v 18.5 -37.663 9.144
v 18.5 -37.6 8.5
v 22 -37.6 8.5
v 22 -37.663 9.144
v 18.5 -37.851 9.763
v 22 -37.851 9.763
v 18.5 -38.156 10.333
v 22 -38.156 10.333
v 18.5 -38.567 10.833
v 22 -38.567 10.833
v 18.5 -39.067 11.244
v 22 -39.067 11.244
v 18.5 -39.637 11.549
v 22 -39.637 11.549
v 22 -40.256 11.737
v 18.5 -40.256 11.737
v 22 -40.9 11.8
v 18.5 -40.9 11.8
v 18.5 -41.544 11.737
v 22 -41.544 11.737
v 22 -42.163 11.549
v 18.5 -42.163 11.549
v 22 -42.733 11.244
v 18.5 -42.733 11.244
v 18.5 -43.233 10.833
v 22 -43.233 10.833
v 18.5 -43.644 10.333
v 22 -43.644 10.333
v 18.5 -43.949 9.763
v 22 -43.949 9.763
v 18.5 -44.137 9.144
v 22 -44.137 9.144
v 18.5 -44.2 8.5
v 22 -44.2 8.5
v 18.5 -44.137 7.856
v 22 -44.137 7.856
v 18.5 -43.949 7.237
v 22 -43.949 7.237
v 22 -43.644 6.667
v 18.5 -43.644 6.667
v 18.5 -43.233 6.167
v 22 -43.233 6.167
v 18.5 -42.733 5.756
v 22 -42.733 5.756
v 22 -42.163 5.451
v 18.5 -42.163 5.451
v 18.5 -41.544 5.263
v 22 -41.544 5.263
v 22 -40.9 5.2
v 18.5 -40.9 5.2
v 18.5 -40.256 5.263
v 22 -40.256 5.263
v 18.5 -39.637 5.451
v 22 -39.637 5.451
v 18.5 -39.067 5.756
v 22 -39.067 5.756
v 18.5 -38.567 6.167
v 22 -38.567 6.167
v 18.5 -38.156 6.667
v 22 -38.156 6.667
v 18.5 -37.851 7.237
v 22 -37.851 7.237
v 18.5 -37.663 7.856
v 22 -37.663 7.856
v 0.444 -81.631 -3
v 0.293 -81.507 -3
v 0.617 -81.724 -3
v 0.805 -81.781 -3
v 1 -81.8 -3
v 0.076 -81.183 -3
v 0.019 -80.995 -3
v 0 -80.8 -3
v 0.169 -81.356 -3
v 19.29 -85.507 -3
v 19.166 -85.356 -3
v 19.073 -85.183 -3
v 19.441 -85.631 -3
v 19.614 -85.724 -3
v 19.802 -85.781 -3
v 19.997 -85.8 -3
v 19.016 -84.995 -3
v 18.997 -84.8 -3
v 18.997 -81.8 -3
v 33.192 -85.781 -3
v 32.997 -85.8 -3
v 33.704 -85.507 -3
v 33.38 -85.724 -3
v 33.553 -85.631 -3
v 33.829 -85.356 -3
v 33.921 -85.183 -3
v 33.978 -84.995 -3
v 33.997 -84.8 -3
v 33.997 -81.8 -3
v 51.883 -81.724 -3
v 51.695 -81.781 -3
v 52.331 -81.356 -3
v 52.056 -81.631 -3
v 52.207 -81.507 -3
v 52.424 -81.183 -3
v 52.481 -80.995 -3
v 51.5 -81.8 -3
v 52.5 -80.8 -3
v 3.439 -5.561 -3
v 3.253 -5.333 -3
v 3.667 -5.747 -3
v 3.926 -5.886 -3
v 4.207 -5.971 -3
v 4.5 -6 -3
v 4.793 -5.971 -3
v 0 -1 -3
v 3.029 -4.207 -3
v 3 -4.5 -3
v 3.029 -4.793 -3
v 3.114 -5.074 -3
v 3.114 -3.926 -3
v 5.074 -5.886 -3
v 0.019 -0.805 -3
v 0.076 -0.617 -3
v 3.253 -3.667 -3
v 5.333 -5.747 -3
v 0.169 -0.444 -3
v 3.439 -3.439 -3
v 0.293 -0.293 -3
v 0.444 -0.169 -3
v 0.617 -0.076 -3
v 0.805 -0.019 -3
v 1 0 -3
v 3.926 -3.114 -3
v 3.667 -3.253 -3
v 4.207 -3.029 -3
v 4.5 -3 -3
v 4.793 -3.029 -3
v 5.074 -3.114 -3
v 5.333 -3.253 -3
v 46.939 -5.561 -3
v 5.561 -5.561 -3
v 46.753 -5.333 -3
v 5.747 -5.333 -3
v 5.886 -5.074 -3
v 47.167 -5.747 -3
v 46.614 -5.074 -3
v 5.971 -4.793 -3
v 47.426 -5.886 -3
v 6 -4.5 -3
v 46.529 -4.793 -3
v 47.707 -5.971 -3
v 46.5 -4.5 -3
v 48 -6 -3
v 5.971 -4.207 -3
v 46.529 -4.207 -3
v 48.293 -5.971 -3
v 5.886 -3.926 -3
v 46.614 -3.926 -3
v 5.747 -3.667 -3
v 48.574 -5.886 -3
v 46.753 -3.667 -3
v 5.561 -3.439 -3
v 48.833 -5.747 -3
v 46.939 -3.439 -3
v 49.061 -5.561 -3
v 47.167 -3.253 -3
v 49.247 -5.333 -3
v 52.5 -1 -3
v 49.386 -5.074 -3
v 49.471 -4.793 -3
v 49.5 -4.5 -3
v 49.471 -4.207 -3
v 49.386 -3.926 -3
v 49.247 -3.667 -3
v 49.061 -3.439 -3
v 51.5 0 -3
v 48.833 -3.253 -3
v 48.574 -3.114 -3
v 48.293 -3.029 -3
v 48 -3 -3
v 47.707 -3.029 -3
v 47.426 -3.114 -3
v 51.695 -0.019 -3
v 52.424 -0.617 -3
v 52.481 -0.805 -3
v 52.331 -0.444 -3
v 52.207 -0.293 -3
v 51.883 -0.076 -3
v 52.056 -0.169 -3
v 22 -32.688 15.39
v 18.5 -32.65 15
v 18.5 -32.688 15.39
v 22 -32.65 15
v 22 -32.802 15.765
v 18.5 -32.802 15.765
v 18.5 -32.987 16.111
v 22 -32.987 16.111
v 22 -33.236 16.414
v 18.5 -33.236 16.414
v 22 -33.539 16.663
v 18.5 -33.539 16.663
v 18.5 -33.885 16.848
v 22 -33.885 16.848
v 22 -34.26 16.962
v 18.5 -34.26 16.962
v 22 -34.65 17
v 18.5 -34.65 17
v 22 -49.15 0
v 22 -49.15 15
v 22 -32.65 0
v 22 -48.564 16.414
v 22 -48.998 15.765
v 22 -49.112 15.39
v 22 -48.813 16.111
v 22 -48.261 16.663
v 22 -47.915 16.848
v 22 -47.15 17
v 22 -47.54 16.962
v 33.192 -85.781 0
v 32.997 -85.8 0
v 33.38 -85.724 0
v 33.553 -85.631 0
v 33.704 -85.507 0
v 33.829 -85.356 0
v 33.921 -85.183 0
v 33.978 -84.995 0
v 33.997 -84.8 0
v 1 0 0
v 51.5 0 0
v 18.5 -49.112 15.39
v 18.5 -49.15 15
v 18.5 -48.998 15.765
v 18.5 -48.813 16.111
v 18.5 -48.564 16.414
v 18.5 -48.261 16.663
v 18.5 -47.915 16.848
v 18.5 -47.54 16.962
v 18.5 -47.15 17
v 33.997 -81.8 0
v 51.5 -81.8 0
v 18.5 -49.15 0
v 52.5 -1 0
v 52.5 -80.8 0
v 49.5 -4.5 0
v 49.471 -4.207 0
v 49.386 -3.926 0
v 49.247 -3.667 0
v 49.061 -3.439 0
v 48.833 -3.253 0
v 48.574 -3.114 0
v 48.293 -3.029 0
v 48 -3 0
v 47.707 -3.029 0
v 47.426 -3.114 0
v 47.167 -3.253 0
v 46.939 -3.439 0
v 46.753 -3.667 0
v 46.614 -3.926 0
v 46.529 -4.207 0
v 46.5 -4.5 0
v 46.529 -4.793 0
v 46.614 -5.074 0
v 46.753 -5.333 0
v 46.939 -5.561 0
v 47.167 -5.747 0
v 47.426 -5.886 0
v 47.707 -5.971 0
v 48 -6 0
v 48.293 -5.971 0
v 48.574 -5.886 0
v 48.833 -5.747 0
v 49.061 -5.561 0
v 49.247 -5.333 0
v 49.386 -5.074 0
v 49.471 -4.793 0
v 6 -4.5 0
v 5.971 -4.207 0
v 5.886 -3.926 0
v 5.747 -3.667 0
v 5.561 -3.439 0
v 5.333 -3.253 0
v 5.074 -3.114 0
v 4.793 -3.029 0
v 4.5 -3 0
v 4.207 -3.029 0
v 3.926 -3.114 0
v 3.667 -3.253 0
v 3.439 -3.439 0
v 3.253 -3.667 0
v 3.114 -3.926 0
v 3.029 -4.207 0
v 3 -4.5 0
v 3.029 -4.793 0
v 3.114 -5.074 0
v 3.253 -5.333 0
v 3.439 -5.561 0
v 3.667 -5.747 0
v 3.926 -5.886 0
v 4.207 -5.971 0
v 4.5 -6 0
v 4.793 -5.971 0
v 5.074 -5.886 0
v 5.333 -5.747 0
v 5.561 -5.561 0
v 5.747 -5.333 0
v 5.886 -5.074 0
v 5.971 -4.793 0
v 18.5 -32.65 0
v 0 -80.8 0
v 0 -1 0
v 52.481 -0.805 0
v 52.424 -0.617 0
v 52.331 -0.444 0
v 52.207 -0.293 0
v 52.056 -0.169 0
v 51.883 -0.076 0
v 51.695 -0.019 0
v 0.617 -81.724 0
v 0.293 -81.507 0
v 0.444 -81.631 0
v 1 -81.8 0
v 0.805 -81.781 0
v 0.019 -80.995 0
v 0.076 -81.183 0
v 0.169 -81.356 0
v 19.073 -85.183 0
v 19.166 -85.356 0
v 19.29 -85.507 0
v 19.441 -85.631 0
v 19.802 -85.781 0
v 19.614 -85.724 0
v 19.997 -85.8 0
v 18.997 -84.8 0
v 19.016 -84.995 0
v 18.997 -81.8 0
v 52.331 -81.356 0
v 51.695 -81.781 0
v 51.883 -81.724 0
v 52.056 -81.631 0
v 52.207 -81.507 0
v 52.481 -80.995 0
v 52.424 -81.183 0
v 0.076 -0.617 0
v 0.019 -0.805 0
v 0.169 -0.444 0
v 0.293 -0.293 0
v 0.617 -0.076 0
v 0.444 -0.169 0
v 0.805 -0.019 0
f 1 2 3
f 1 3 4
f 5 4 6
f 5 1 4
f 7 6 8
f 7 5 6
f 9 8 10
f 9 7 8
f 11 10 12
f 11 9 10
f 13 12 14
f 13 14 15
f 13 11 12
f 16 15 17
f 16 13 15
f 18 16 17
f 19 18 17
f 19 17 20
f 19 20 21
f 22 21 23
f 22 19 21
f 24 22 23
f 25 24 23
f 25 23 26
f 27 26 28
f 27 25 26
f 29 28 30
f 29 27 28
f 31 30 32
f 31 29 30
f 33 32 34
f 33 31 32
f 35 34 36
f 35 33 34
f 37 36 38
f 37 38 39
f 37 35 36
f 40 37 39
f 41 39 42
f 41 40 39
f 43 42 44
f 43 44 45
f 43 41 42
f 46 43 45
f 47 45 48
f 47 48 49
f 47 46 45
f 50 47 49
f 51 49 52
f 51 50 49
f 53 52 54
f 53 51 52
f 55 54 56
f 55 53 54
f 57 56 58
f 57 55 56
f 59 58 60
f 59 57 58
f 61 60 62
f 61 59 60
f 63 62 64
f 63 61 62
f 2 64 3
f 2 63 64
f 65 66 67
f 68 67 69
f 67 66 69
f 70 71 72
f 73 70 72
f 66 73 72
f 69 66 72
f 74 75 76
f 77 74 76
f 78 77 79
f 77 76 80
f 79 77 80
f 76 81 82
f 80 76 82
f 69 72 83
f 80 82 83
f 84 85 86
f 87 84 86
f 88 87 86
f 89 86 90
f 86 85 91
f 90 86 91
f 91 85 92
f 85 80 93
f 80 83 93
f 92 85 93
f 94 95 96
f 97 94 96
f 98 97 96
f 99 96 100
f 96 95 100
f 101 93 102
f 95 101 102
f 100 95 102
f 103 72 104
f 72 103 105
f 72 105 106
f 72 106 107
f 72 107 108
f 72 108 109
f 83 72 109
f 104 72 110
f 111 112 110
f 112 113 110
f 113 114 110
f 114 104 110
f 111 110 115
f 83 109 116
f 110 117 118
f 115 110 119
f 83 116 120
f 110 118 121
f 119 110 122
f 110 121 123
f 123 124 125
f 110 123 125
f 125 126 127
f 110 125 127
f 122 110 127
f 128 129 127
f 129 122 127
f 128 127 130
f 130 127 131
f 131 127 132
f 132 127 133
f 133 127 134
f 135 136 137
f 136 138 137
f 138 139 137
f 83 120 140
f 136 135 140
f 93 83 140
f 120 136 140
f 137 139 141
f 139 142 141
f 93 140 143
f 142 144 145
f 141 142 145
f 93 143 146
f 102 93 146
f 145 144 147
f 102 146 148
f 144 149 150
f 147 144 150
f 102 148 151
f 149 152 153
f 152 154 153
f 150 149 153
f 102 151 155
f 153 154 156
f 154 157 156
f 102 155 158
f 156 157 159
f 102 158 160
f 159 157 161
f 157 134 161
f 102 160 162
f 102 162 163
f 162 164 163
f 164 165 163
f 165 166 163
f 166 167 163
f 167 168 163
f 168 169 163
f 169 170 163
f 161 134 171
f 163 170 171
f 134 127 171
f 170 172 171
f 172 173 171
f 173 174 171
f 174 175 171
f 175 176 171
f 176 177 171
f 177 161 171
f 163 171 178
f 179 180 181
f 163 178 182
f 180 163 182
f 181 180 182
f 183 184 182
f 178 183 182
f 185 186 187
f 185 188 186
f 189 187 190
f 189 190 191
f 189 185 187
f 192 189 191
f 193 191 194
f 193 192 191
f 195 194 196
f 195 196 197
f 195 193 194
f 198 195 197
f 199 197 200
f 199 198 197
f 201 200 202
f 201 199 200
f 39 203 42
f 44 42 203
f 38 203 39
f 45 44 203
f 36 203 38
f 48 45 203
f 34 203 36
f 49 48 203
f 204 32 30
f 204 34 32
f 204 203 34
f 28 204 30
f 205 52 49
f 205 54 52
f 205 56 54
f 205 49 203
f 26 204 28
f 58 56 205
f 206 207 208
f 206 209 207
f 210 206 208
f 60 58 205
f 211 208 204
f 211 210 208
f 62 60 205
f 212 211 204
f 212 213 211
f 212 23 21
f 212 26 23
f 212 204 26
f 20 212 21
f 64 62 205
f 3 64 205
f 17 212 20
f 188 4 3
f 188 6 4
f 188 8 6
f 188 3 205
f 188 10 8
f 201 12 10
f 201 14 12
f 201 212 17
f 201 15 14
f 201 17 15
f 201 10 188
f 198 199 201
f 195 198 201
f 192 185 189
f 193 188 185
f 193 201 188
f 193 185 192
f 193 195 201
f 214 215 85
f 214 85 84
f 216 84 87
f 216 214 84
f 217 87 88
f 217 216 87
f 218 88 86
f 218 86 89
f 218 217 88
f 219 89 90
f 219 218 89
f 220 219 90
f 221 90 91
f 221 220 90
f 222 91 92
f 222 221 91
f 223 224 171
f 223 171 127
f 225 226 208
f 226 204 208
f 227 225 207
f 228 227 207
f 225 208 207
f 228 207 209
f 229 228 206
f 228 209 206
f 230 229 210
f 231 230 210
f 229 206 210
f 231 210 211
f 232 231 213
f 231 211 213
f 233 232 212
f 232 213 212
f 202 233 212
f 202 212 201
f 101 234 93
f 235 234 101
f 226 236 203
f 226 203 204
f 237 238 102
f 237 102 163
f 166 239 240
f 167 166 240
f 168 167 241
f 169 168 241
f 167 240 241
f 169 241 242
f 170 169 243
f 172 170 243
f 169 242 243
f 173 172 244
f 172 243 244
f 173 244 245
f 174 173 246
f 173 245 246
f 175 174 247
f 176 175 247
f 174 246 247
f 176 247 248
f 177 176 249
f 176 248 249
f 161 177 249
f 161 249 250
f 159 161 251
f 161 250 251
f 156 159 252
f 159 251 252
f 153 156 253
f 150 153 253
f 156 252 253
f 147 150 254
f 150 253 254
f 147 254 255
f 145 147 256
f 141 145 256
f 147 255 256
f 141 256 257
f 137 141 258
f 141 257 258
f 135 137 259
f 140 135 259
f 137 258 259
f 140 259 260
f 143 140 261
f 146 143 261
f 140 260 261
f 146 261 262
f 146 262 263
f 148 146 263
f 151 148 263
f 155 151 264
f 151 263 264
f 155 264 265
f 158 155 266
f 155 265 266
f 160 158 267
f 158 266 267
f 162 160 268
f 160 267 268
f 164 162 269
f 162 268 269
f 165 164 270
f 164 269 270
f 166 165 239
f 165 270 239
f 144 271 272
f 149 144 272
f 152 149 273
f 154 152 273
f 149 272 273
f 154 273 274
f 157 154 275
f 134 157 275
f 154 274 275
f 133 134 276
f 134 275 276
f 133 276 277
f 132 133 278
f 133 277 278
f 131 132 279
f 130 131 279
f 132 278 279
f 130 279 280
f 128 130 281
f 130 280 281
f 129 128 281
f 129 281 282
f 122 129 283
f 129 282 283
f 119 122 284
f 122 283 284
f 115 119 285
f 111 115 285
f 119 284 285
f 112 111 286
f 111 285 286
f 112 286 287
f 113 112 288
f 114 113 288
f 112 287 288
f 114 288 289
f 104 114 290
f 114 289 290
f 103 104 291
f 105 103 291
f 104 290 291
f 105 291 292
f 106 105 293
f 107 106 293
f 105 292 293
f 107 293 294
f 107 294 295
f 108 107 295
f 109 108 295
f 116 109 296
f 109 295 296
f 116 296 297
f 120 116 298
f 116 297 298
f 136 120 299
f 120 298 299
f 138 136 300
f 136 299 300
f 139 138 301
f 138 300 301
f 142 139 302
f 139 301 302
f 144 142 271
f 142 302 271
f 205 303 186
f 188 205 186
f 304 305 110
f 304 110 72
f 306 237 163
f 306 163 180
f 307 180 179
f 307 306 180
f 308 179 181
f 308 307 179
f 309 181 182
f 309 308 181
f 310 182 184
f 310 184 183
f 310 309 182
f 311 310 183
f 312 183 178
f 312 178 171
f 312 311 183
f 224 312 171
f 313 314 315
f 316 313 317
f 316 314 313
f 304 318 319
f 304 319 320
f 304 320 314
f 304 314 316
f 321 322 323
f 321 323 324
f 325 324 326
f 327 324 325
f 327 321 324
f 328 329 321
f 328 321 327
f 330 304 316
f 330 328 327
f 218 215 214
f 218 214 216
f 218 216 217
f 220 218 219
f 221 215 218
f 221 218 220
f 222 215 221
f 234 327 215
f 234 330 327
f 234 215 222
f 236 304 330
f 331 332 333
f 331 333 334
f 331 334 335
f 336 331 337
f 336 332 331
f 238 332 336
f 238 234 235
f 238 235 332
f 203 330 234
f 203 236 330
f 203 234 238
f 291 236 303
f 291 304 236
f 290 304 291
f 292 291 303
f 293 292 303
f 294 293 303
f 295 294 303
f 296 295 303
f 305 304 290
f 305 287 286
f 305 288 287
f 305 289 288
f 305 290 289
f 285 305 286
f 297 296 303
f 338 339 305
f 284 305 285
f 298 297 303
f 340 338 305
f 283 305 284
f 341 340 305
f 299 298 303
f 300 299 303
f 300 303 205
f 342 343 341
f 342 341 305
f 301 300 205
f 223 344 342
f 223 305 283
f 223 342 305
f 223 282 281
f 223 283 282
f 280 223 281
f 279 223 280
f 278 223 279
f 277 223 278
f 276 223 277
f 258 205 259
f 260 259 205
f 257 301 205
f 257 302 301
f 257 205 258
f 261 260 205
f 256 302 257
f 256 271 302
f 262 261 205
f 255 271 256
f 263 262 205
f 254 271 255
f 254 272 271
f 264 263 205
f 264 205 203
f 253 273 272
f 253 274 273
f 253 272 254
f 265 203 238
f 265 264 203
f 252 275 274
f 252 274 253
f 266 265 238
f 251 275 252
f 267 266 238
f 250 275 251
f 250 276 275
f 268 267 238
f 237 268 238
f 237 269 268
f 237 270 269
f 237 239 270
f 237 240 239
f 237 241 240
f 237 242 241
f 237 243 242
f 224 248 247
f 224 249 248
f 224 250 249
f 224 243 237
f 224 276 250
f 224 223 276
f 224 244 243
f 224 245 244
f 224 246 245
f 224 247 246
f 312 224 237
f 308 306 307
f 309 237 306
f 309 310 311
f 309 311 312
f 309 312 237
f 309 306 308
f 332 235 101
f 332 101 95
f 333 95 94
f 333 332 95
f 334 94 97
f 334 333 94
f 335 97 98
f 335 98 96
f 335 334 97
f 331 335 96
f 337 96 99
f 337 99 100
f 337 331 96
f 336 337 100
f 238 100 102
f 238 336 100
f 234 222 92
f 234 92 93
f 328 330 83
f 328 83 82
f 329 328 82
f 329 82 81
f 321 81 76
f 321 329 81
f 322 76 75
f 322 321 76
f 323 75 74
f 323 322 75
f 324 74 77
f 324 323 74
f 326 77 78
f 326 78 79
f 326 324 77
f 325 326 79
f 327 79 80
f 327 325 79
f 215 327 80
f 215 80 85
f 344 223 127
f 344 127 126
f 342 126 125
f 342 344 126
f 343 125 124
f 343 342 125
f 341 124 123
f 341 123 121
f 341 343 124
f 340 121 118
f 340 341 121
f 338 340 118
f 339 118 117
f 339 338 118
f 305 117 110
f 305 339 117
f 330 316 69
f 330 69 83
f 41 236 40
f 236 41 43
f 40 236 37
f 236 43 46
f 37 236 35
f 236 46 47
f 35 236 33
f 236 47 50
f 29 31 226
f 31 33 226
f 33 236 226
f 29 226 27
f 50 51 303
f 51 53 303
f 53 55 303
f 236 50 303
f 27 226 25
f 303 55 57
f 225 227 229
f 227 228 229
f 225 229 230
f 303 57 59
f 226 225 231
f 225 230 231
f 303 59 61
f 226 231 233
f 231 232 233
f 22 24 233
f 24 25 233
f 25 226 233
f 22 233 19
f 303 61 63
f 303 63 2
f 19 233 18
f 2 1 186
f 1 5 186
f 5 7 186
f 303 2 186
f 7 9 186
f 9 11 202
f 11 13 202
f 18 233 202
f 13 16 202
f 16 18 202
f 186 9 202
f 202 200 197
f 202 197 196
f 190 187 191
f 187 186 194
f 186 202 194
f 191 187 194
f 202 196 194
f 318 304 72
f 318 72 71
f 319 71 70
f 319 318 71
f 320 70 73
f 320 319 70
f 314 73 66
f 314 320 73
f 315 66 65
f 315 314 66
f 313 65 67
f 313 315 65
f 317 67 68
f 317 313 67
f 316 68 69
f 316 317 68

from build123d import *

# Parameters (mm, degrees)
F0_R     = 1.5
F1_DEPTH = 3
F3_START = 18.5
F2_W     = 16.5
F2_H     = 17
F2_R     = 3.3
F3_DEPTH = 3.5
F4_R     = 2


with BuildPart() as f1:
    # F0 (on Top) → F1 (new body)
    with BuildSketch(Plane.XY):
        with BuildLine():
            Line((26.25, 0), (1, 0))
            ThreePointArc((1, 0), (0.2928932188, -0.2928932188), (0, -1))
            Line((0, -1), (0, -40.9))
            Line((0, -40.9), (26.25, -40.9))
            Line((26.25, -40.9), (26.25, 0))
        make_face()
        with Locations((4.5, -4.5)):
            Circle(F0_R, mode=Mode.SUBTRACT)
        with BuildLine():
            Line((51.5, 0), (26.25, 0))
            Line((26.25, 0), (26.25, -40.9))
            Line((26.25, -40.9), (52.5, -40.9))
            Line((52.5, -40.9), (52.5, -1))
            ThreePointArc((52.5, -1), (52.2071067812, -0.2928932188), (51.5, 0))
        make_face()
        with Locations((48, -4.5)):
            Circle(F0_R, mode=Mode.SUBTRACT)
        with BuildLine():
            Line((52.5, -40.9), (26.25, -40.9))
            Line((26.25, -40.9), (26.25, -81.8))
            Line((26.25, -81.8), (33.997034058, -81.8))
            Line((33.997034058, -81.8), (51.5, -81.8))
            ThreePointArc((51.5, -81.8), (52.2071067812, -81.5071067812), (52.5, -80.8))
            Line((52.5, -80.8), (52.5, -40.9))
        make_face()
        with BuildLine():
            Line((26.25, -81.8), (26.25, -40.9))
            Line((26.25, -40.9), (0, -40.9))
            Line((0, -40.9), (0, -80.8))
            ThreePointArc((0, -80.8), (0.2928932188, -81.5071067812), (1, -81.8))
            Line((1, -81.8), (18.997034058, -81.8))
            Line((18.997034058, -81.8), (26.25, -81.8))
        make_face()
        with BuildLine():
            Line((26.25, -85.8), (26.25, -81.8))
            Line((26.25, -81.8), (18.997034058, -81.8))
            Line((18.997034058, -81.8), (18.997034058, -84.8))
            ThreePointArc((18.997034058, -84.8), (19.2899272768, -85.5071067812), (19.997034058, -85.8))
            Line((19.997034058, -85.8), (26.25, -85.8))
        make_face()
        with BuildLine():
            Line((33.997034058, -81.8), (26.25, -81.8))
            Line((26.25, -81.8), (26.25, -85.8))
            Line((26.25, -85.8), (32.997034058, -85.8))
            ThreePointArc((32.997034058, -85.8), (33.7041408392, -85.5071067812), (33.997034058, -84.8))
            Line((33.997034058, -84.8), (33.997034058, -81.8))
        make_face()
    extrude(amount=-F1_DEPTH)

    # F2 (on Right) → F3 (join)
    with BuildSketch(Plane.YZ.offset(F3_START)):
        with Locations((-40.9, 8.5)):
            Rectangle(F2_W, F2_H)
        with Locations((-40.9, 8.5)):
            Circle(F2_R, mode=Mode.SUBTRACT)
    extrude(amount=F3_DEPTH)

    # F4
    f4_edges = [f1.edges().sort_by_distance(p)[0] for p in [
        (20.25, -49.15, 17),
        (20.25, -32.65, 17),
    ]]
    fillet(f4_edges, radius=F4_R)


solid = f1.part
